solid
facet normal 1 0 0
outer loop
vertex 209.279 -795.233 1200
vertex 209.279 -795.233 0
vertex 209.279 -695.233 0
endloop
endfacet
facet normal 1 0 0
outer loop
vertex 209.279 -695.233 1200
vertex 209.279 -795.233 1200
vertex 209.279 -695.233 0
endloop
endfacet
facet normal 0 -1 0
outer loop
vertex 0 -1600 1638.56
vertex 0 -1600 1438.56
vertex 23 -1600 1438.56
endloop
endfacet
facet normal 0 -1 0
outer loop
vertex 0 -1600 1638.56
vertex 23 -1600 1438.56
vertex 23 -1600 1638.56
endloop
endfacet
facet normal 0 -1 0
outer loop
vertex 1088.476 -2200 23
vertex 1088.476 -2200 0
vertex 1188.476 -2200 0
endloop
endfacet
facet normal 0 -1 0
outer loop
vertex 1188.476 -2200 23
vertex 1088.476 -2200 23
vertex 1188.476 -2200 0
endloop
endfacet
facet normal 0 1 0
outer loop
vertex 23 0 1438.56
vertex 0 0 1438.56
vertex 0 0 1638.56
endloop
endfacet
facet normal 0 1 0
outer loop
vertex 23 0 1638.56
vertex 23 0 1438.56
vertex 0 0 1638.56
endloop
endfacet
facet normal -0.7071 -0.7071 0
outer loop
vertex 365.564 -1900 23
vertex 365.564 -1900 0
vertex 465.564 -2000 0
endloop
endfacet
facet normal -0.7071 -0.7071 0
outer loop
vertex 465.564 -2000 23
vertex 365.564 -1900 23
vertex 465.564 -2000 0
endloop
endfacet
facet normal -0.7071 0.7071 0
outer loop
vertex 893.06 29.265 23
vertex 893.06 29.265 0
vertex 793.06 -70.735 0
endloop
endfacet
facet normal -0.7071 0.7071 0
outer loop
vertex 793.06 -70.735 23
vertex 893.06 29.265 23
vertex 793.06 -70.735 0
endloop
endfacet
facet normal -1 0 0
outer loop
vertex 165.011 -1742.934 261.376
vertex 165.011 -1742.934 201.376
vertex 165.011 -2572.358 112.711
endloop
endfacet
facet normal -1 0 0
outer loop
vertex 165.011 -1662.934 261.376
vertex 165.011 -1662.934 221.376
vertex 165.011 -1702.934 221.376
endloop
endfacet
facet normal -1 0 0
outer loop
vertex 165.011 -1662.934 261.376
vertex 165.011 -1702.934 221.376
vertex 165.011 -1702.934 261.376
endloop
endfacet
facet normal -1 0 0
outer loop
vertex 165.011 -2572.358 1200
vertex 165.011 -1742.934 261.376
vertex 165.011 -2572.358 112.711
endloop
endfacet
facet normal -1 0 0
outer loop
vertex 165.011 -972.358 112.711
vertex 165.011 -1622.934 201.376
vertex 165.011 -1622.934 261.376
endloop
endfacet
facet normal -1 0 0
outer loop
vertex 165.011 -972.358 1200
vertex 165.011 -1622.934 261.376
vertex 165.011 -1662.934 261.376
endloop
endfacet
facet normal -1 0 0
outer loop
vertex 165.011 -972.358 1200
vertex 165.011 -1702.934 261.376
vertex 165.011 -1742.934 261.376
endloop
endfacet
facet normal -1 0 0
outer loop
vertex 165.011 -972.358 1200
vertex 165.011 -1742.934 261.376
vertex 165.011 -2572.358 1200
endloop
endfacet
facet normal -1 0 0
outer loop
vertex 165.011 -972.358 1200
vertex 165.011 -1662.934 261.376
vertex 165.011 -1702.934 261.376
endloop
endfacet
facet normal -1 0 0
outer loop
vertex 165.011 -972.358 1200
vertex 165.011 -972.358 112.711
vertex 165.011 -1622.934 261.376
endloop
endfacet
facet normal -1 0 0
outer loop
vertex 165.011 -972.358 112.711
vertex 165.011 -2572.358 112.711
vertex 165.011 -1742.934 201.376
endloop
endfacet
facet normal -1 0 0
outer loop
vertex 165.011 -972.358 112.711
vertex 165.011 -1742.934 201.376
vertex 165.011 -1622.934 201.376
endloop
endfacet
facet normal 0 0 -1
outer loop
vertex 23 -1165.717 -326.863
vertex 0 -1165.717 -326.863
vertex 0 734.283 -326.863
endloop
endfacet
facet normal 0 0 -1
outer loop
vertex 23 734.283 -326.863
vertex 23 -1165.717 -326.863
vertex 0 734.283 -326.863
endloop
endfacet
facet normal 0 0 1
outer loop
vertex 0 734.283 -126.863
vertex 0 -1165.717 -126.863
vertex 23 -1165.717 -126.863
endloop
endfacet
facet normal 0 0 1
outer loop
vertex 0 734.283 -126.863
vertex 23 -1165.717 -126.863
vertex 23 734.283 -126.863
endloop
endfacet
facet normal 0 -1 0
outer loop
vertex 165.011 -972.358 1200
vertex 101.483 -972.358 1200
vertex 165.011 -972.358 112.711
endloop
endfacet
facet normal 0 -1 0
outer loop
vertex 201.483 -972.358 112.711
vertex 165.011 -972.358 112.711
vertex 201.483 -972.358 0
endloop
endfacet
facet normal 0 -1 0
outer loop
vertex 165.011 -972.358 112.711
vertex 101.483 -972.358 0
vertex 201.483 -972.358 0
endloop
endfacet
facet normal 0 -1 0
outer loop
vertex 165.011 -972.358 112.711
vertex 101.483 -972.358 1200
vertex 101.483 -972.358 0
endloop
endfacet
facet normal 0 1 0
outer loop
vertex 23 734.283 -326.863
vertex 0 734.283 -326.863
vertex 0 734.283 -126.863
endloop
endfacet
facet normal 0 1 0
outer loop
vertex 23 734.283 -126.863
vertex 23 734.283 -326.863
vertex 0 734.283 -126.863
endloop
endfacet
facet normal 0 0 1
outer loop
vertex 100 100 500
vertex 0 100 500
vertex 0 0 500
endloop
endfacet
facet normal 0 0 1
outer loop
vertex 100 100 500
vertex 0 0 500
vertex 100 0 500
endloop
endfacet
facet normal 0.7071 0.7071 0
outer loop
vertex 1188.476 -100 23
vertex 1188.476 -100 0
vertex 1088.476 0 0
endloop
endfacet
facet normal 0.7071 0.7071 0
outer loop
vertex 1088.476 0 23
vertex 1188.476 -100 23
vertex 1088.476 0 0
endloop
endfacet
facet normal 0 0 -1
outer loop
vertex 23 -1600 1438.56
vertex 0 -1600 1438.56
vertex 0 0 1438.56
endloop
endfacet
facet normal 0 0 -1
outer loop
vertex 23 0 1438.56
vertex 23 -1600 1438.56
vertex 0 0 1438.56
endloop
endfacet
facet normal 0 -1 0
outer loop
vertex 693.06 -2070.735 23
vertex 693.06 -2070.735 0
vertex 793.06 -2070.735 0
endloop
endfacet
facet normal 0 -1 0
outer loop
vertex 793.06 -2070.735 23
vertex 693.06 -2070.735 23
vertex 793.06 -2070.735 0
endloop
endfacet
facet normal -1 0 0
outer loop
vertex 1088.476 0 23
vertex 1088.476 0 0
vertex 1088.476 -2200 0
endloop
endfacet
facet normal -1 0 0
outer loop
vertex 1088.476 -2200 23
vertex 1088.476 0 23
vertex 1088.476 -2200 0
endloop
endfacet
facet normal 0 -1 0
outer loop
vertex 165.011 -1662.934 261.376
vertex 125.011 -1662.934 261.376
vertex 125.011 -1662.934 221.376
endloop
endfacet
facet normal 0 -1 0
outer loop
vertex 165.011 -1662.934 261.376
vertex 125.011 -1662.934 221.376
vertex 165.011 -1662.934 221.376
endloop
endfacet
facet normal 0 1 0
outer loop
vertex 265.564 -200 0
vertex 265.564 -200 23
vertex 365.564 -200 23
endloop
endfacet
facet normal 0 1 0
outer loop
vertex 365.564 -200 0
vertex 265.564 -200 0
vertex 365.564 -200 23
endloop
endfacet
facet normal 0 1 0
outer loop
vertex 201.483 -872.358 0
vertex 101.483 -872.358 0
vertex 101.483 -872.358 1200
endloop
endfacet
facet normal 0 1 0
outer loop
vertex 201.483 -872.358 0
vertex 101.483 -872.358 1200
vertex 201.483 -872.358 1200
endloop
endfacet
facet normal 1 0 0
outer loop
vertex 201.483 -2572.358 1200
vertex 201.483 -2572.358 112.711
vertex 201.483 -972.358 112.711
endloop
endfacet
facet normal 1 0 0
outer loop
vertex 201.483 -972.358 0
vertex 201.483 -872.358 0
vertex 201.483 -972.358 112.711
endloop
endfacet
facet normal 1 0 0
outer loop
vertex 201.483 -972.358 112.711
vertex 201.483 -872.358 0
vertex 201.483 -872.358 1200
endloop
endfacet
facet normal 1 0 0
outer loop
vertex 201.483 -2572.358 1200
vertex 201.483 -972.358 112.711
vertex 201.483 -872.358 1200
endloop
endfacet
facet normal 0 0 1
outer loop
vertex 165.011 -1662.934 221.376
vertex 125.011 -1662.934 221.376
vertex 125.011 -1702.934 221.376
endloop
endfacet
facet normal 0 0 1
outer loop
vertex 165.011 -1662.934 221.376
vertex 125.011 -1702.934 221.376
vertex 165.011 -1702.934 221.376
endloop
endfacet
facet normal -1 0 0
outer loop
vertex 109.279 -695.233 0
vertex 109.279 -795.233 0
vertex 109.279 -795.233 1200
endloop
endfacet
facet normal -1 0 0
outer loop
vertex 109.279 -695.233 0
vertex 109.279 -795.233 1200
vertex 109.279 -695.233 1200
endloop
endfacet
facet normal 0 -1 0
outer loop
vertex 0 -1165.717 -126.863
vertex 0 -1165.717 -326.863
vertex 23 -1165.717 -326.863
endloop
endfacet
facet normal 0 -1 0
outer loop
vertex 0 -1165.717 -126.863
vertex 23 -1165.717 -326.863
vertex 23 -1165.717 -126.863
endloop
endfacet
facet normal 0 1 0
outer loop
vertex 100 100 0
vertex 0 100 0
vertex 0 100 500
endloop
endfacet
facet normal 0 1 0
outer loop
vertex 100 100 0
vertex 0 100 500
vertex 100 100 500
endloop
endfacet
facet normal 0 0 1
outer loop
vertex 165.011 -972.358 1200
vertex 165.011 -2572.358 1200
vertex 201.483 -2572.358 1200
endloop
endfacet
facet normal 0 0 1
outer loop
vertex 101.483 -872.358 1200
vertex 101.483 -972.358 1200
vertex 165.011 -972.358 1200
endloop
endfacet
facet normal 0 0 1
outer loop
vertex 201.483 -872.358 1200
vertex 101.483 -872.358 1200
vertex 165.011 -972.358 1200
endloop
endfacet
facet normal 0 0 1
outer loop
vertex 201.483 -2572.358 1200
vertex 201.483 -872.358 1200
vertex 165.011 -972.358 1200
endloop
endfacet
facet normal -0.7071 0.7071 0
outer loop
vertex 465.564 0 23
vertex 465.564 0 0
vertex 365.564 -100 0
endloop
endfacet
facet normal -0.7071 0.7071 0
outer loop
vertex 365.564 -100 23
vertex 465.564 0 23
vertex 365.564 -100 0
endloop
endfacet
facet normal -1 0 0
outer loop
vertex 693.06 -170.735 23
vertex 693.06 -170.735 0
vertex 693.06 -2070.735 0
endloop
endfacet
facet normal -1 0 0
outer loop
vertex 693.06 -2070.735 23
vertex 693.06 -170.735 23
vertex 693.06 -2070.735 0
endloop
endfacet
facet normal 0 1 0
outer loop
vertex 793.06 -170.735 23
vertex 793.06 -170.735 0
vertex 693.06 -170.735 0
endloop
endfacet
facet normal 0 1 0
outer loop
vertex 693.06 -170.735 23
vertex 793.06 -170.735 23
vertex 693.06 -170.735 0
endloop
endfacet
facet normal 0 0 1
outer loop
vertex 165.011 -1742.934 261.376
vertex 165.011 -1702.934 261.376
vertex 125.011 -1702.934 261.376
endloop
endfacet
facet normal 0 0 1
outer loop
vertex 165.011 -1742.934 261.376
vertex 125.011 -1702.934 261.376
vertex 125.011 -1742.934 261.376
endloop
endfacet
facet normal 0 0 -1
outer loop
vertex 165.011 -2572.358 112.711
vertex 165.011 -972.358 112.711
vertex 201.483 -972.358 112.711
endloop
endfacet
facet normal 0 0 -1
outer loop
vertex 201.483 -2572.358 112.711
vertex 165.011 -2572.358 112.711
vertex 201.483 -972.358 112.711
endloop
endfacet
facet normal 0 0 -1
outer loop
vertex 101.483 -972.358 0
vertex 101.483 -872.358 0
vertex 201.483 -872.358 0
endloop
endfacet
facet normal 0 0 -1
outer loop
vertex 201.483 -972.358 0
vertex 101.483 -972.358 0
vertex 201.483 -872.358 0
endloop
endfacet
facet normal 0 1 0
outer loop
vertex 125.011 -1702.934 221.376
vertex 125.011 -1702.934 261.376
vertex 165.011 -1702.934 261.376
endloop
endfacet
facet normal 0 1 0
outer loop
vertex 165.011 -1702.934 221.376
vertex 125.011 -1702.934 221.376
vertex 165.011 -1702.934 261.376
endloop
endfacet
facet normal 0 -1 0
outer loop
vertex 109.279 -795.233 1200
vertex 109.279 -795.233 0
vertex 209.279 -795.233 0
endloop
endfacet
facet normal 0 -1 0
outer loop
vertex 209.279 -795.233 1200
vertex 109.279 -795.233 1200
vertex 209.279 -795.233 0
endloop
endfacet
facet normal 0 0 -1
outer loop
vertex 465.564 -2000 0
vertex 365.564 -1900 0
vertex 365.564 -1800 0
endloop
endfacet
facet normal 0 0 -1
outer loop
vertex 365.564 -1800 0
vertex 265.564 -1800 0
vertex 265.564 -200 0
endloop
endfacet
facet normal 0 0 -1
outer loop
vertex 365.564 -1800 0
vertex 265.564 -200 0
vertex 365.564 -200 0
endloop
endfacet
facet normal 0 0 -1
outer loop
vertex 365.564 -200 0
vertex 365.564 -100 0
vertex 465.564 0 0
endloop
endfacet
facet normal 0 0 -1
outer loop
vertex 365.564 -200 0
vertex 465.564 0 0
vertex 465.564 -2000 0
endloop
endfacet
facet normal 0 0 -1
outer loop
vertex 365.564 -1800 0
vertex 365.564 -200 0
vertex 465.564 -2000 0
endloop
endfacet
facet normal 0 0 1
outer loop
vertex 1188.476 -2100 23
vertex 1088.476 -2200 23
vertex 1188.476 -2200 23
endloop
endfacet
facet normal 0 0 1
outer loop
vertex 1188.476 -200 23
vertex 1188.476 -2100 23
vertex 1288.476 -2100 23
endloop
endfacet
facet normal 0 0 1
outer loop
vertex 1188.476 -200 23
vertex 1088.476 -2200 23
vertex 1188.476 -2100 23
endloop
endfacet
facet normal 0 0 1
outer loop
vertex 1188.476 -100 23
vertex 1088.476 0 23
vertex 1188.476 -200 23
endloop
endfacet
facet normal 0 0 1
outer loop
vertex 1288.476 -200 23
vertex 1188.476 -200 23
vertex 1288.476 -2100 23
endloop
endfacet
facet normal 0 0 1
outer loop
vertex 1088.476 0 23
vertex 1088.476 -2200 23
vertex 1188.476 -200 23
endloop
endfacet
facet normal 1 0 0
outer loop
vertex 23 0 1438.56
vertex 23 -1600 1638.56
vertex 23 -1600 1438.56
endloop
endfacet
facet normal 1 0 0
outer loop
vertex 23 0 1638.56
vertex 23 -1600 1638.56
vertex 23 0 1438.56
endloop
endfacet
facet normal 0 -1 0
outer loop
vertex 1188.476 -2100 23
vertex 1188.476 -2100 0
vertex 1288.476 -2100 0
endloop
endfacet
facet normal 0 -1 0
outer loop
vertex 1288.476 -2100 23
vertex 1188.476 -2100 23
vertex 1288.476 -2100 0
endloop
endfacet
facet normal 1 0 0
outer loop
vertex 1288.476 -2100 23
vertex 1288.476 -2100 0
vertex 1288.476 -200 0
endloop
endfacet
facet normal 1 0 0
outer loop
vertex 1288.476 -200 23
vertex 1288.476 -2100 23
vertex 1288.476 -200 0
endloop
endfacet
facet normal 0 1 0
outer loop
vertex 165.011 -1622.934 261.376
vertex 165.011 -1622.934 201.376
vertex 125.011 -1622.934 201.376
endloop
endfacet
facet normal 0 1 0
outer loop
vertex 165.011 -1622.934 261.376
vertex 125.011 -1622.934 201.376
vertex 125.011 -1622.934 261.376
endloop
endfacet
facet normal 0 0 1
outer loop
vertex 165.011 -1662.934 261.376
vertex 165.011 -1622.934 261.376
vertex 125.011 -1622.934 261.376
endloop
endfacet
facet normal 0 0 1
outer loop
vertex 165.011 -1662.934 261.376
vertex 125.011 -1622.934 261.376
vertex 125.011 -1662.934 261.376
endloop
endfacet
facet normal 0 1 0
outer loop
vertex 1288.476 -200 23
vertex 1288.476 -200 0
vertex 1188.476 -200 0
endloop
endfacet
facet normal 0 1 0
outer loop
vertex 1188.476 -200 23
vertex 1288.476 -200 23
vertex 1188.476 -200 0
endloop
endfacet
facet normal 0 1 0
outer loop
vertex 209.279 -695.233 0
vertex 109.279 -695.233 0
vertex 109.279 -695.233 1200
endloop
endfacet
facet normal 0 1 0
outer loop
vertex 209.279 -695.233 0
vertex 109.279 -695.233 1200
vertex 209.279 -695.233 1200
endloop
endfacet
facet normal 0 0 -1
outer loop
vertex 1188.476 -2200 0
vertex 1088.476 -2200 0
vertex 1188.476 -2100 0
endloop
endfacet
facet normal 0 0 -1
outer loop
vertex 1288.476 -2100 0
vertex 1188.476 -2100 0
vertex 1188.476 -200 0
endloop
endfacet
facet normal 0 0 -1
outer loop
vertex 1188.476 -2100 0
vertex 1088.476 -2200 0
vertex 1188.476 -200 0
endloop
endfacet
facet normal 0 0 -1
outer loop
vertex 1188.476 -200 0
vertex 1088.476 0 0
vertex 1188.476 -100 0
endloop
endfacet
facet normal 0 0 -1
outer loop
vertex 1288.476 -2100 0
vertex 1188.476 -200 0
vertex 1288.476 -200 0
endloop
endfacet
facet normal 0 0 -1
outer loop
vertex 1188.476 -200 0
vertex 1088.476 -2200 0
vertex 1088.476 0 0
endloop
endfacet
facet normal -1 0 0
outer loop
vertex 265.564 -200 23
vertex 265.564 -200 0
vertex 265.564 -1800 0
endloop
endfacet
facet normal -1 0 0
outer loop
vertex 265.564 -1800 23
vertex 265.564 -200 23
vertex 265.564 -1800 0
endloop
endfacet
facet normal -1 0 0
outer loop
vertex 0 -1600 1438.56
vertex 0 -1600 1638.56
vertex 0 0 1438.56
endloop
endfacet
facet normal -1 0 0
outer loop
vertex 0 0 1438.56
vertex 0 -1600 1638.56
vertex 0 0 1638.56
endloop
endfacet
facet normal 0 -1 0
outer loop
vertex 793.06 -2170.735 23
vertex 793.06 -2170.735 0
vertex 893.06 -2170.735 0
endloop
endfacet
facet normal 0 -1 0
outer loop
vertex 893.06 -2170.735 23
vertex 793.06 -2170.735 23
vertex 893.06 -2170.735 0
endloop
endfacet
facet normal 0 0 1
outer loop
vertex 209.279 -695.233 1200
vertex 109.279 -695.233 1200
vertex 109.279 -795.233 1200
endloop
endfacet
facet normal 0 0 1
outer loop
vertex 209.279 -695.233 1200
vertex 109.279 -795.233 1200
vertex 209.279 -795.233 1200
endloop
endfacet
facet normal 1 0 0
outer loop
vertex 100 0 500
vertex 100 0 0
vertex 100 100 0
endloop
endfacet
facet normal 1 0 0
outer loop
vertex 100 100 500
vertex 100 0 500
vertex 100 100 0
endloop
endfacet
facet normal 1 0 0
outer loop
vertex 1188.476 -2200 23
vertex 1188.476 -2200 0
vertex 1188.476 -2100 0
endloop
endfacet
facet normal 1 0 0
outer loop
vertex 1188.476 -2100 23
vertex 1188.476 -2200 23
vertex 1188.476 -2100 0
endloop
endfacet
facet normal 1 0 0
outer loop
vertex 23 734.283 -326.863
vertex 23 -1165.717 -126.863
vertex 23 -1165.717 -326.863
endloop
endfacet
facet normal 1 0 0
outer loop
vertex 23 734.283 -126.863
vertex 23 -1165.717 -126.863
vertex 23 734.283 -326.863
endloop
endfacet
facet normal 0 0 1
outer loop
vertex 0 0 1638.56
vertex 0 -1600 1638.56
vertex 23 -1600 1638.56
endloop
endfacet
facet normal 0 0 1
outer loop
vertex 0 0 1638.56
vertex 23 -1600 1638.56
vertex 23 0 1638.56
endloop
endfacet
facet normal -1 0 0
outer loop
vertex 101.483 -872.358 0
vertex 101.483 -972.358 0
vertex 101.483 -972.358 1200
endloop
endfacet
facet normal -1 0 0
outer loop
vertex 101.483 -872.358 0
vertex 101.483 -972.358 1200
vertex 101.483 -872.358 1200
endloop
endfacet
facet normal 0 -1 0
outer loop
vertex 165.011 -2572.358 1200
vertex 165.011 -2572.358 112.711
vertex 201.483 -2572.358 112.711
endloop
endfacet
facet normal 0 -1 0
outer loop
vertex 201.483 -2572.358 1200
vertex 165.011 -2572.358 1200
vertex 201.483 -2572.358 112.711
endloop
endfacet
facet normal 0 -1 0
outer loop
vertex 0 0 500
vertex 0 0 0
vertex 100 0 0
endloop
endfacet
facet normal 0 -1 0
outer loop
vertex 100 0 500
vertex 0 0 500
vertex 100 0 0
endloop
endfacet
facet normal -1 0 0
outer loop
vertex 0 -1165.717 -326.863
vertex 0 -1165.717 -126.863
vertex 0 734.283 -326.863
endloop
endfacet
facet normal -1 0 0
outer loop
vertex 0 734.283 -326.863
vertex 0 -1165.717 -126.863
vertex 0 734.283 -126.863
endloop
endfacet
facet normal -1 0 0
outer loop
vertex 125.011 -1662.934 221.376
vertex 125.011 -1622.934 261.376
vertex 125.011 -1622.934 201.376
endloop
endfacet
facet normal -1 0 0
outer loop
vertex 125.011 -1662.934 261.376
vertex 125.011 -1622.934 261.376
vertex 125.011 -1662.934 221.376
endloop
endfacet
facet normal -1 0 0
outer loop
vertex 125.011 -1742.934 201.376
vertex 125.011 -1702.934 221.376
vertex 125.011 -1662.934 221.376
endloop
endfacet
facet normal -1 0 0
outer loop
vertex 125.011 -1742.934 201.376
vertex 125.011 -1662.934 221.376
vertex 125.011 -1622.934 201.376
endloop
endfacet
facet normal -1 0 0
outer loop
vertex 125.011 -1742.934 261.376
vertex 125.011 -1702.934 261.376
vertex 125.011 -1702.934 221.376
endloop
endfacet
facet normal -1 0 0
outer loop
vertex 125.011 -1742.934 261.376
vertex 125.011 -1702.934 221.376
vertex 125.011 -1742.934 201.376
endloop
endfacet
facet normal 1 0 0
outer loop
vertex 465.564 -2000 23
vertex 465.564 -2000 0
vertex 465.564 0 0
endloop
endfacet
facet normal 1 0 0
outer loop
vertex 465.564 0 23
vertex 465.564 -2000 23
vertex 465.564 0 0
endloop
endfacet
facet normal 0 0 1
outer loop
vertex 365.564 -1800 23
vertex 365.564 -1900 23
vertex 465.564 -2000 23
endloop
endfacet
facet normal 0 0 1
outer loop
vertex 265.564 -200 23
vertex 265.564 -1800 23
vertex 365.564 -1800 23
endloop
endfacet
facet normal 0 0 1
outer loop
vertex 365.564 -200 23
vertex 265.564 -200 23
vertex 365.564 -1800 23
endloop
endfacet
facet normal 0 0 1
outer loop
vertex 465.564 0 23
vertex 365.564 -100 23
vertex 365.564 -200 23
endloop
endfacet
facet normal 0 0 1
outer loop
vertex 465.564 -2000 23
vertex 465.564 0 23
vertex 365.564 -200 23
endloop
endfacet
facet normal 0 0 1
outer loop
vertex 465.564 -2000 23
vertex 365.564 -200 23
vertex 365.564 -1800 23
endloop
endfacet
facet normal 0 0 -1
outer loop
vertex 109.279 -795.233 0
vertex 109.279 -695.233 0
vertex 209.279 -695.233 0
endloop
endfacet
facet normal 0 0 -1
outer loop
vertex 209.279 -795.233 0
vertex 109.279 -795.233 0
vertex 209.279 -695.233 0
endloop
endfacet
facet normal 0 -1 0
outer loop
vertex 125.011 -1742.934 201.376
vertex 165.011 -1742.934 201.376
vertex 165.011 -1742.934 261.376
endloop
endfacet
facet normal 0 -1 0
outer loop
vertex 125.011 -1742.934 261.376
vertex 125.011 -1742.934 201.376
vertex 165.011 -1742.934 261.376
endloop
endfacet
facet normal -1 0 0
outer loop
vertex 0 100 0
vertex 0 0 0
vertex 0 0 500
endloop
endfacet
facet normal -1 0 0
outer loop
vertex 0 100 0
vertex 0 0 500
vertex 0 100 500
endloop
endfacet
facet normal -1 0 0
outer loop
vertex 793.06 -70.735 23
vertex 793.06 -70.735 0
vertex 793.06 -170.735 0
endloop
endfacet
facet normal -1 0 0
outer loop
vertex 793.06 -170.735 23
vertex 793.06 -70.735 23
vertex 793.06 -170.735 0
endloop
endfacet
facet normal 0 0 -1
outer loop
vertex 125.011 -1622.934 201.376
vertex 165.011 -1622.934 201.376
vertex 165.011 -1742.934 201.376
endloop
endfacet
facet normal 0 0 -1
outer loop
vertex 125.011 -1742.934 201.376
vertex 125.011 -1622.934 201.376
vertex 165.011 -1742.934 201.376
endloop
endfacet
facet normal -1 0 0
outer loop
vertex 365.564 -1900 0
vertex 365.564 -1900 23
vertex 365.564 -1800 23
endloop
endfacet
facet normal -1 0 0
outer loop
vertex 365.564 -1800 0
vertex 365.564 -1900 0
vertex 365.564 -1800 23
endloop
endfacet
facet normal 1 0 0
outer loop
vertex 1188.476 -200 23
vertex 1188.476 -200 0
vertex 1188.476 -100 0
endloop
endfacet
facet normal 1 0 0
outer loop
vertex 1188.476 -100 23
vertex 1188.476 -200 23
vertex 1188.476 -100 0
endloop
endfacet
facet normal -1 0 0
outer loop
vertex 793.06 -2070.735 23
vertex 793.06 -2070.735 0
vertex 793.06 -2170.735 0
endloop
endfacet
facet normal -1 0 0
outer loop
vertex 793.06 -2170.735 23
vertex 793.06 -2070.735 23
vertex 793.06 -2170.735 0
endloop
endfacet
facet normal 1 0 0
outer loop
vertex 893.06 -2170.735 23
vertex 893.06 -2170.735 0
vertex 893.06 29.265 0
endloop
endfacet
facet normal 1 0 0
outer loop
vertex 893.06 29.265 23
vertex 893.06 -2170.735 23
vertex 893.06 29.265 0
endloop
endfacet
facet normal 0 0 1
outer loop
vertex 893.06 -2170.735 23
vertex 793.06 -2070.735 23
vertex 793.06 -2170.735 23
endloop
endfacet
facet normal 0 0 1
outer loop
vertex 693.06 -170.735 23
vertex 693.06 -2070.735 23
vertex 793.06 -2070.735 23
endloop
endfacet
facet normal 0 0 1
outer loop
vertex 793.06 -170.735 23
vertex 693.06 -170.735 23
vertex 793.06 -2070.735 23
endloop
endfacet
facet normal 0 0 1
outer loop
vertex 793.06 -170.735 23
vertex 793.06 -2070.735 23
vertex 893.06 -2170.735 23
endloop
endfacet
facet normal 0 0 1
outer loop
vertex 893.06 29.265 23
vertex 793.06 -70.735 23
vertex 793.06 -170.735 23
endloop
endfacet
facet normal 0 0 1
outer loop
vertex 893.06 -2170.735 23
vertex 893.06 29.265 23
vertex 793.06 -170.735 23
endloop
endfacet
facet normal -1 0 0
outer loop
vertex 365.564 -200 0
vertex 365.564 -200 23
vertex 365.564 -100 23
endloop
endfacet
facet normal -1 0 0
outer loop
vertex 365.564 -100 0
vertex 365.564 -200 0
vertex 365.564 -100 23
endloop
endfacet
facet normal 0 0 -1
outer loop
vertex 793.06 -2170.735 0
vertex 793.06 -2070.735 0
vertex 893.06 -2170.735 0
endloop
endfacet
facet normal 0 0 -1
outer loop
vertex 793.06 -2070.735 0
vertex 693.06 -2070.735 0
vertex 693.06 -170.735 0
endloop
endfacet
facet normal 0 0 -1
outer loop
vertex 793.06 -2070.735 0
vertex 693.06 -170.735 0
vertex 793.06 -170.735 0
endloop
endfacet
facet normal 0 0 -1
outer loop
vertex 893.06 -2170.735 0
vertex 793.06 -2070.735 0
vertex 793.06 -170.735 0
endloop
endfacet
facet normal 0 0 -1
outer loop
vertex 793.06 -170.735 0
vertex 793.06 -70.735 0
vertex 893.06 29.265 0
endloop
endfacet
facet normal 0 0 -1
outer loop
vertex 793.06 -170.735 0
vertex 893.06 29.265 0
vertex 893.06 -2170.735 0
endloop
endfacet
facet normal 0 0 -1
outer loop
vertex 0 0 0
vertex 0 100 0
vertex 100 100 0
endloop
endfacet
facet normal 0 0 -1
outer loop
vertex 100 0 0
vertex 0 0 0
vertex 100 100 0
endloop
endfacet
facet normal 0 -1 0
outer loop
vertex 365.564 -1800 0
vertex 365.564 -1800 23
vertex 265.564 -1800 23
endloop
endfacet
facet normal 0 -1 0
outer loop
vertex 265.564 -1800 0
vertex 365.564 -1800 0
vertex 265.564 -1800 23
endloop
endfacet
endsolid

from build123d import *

# Parameters (mm, degrees)
F0_W      = 100
F0_H      = 100
F1_DEPTH  = 500
F2_W      = 1600
F2_H      = 200
F3_DEPTH  = 23
F5_DEPTH  = 23
F7_DEPTH  = 23
F9_DEPTH  = 23
F10_W     = 100
F10_H     = 100
F11_DEPTH = 1200
F12_W     = 36.471832
F12_H     = 1087.289286
F13_DEPTH = 1600
F14_W     = 120
F14_H     = 60
F15_DEPTH = 40
F16_W     = 40
F16_H     = 40
F17_DEPTH = 40
F18_W     = 1900
F18_H     = 200
F19_DEPTH = 23
F21_DEPTH = 23
F23_DEPTH = 23
F24_W     = 100
F24_H     = 100
F25_DEPTH = 1200


with BuildPart() as f1:
    # F0 (on Top) → F1 (new body)
    with BuildSketch(Plane.XY):
        with Locations((50, 50)):
            Rectangle(F0_W, F0_H)
    extrude(amount=F1_DEPTH)


with BuildPart() as f3:
    # F2 (on Right) → F3 (new body)
    with BuildSketch(Plane.YZ):
        with Locations((-800, 1538.560049)):
            Rectangle(F2_W, F2_H)
    extrude(amount=F3_DEPTH)


with BuildPart() as f5:
    # F4 (on Top) → F5 (new body)
    with BuildSketch(Plane.XY):
        Polygon((465.564324, 0), (265.564324, -200), (265.564324, -1800), (465.564324, -2000), align=None)
    extrude(amount=F5_DEPTH)

    # F6 (on face) → F7 (cut)
    with BuildSketch(Plane.XY.offset(23)):
        Polygon((365.564324, -1800), (265.564324, -1800), (365.564324, -1900), align=None)
    extrude(amount=-F7_DEPTH, mode=Mode.SUBTRACT)

    # F8 (on face) → F9 (cut)
    with BuildSketch(Plane.XY.offset(23)):
        Polygon((365.564324, -100), (265.564324, -200), (365.564324, -200), align=None)
    extrude(amount=-F9_DEPTH, mode=Mode.SUBTRACT)


with BuildPart() as f11:
    # F10 (on Top) → F11 (new body)
    with BuildSketch(Plane.XY):
        with Locations((151.482761, -922.357982)):
            Rectangle(F10_W, F10_H)
    extrude(amount=F11_DEPTH)

    # F12 (on face) → F13 (join)
    with BuildSketch(Plane.XZ.offset(972.357982)):
        with Locations((183.246845, 656.355357)):
            Rectangle(F12_W, F12_H)
    extrude(amount=F13_DEPTH)

    # F14 (on face) → F15 (join)
    with BuildSketch(Plane(origin=(165.010929, 0, 0), x_dir=(0, -1, 0), z_dir=(-1, 0, 0))):
        with Locations((1682.933529, 231.375635)):
            Rectangle(F14_W, F14_H)
    extrude(amount=F15_DEPTH)

    # F16 (on face) → F17 (cut)
    with BuildSketch(Plane.XY.offset(261.375635)):
        with Locations((145.010929, -1682.933529)):
            Rectangle(F16_W, F16_H)
    extrude(amount=-F17_DEPTH, mode=Mode.SUBTRACT)


with BuildPart() as f19:
    # F18 (on Right) → F19 (new body)
    with BuildSketch(Plane.YZ):
        with Locations((-215.717066, -226.863098)):
            Rectangle(F18_W, F18_H)
    extrude(amount=F19_DEPTH)


with BuildPart() as f21:
    # F20 (on Top) → F21 (new body)
    with BuildSketch(Plane.XY):
        Polygon((793.060017, -170.734648), (693.060017, -170.734648), (693.060017, -2070.734648), (793.060017, -2070.734648), (793.060017, -2170.734648), (893.060017, -2170.734648), (893.060017, 29.265352), (793.060017, -70.734648), align=None)
    extrude(amount=F21_DEPTH)


with BuildPart() as f23:
    # F22 (on Top) → F23 (new body)
    with BuildSketch(Plane.XY):
        Polygon((1188.475997, -100), (1088.475997, 0), (1088.475997, -2200), (1188.475997, -2200), (1188.475997, -2100), (1288.475997, -2100), (1288.475997, -200), (1188.475997, -200), align=None)
    extrude(amount=F23_DEPTH)


with BuildPart() as f25:
    # F24 (on Top) → F25 (new body)
    with BuildSketch(Plane.XY):
        with Locations((159.279283, -745.232552)):
            Rectangle(F24_W, F24_H)
    extrude(amount=F25_DEPTH)


solid = Compound([f1.part, f3.part, f5.part, f11.part, f19.part, f21.part, f23.part, f25.part])
